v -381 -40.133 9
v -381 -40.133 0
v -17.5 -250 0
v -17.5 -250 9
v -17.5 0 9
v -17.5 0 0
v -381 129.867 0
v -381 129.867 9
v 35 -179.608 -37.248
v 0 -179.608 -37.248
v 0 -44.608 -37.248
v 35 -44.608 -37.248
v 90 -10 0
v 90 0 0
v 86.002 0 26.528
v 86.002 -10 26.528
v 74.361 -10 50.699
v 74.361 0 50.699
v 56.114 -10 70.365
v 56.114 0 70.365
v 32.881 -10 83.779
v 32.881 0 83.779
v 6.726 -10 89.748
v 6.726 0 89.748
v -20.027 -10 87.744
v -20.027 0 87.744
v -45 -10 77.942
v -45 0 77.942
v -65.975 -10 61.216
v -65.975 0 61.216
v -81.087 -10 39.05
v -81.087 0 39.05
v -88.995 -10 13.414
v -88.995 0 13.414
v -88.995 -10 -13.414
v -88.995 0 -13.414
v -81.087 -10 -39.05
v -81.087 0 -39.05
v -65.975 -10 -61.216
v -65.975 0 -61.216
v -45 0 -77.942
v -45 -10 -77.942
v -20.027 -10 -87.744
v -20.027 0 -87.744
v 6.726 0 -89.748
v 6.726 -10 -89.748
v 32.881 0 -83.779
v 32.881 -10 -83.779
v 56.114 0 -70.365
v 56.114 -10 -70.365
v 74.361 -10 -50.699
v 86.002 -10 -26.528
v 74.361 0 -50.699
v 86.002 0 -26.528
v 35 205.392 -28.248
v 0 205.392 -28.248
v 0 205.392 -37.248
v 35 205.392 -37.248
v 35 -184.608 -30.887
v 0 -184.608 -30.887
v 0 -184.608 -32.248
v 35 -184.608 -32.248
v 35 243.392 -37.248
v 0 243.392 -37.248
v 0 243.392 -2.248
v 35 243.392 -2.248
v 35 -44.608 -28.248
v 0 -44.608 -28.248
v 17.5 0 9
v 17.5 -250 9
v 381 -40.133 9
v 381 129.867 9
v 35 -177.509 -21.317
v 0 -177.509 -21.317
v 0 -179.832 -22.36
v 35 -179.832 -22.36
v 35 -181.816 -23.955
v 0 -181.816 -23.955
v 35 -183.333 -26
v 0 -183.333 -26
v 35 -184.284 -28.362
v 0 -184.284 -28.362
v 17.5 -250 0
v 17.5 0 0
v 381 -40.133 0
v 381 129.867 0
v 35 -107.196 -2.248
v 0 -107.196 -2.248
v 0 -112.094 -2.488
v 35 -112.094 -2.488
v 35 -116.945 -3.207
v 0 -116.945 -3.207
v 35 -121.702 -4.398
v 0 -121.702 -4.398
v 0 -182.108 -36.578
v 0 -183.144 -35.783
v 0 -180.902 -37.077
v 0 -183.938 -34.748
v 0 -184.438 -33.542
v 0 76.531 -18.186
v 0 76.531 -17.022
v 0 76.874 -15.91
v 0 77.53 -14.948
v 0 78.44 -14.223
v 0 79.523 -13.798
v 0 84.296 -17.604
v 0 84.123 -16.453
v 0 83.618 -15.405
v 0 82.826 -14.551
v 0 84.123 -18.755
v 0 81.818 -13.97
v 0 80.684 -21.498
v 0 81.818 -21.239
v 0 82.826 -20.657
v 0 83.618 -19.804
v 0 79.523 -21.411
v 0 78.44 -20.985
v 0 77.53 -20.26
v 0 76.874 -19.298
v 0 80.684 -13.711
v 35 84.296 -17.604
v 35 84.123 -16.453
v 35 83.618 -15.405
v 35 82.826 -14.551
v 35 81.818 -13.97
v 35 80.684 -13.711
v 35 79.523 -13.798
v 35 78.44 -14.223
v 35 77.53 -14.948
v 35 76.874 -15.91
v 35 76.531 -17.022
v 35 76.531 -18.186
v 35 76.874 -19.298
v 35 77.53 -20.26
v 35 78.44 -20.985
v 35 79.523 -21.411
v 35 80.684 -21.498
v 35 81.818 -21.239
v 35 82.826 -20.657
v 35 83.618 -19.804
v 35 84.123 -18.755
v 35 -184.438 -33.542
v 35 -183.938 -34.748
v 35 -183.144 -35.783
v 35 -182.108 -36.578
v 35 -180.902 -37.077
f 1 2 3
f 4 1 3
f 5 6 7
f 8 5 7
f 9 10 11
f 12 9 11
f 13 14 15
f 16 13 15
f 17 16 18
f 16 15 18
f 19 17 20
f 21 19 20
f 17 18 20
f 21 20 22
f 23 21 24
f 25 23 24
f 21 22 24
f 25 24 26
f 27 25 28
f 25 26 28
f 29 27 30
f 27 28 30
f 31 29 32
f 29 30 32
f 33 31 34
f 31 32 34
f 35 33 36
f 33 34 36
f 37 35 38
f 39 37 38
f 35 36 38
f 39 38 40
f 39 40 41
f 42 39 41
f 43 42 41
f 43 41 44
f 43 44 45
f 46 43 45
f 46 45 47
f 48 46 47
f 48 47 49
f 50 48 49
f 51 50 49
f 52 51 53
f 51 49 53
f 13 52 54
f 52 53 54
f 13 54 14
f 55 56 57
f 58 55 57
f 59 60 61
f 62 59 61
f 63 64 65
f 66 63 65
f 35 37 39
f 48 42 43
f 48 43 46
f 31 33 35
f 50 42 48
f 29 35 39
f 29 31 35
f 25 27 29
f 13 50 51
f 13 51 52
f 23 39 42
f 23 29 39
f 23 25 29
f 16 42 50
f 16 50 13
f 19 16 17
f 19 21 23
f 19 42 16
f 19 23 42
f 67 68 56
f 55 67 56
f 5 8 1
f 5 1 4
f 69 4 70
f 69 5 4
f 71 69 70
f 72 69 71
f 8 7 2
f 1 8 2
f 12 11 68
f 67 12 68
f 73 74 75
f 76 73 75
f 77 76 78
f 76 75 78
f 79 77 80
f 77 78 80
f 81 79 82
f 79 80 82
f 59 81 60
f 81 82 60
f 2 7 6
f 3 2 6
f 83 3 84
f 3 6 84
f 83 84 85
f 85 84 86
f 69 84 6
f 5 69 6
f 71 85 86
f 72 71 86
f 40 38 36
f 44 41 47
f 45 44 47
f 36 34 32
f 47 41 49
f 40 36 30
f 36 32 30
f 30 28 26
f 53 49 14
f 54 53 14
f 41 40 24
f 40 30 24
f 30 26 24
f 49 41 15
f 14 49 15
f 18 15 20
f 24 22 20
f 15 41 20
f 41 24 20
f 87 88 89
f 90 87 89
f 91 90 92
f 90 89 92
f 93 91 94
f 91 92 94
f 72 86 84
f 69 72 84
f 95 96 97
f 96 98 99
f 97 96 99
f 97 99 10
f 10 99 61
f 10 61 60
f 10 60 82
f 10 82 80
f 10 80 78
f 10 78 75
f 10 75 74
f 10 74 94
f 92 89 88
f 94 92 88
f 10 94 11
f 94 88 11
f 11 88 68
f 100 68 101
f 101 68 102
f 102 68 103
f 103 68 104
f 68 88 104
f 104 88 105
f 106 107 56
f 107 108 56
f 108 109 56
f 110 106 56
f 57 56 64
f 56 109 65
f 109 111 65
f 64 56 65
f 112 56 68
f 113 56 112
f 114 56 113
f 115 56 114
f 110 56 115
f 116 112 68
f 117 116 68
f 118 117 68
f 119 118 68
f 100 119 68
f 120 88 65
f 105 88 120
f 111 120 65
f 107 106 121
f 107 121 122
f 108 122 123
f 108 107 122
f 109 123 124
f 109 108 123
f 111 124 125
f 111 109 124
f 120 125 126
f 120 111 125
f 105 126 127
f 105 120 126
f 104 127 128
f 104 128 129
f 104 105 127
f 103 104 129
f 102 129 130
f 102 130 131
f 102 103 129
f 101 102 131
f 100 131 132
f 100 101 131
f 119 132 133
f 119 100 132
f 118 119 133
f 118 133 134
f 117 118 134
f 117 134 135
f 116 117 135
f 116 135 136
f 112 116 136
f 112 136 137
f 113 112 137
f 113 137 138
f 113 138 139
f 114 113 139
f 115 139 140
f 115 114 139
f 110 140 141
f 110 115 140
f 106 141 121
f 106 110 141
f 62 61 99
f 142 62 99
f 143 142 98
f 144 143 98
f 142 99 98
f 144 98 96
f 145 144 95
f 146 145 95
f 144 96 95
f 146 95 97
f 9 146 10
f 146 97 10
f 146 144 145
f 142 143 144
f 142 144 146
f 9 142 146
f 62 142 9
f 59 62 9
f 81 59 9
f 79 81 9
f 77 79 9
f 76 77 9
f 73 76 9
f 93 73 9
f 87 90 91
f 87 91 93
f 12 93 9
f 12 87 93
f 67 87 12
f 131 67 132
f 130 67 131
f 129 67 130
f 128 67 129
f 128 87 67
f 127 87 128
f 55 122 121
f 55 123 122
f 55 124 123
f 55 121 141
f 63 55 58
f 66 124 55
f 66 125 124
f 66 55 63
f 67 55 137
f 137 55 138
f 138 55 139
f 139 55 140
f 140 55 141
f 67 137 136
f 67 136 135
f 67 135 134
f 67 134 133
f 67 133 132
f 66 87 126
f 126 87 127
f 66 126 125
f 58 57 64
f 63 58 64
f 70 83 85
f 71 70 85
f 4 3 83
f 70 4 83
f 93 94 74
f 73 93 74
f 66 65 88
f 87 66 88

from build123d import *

# Parameters (mm, degrees)
F1_DEPTH = 9
F2_R     = 90
F3_DEPTH = 10
F4_R     = 3.904465
F5_DEPTH = 35


with BuildPart() as f1:
    # F0 (on Top) → F1 (new body)
    with BuildSketch(Plane.XY):
        Polygon((-17.5, 0), (-381, 129.866823), (-381, -40.133177), (-17.5, -250), (17.5, -250), (381, -40.133177), (381, 129.866823), (17.5, 0), (0, 0), align=None)
    extrude(amount=F1_DEPTH)


with BuildPart() as f3:
    # F2 (on Front) → F3 (new body)
    with BuildSketch(Plane.XZ):
        Circle(F2_R)
    extrude(amount=F3_DEPTH)


with BuildPart() as f5:
    # F4 (on Right) → F5 (new body)
    with BuildSketch(Plane.YZ):
        with BuildLine():
            Line((-114.608236, -37.247673), (-44.608236, -37.247673))
            Line((-44.608236, -37.247673), (-44.608236, -28.247673))
            Line((-44.608236, -28.247673), (80.391764, -28.247673))
            Line((80.391764, -28.247673), (205.391764, -28.247673))
            Line((205.391764, -28.247673), (205.391764, -37.247673))
            Line((205.391764, -37.247673), (243.391764, -37.247673))
            Line((243.391764, -37.247673), (243.391764, -2.247673))
            Line((243.391764, -2.247673), (-107.195699, -2.247673))
            ThreePointArc((-107.195699, -2.247673), (-114.528097, -2.788236), (-121.70195, -4.398236))
            Line((-121.70195, -4.398236), (-177.509486, -21.3171))
            ThreePointArc((-177.509486, -21.3171), (-182.639814, -24.929324), (-184.608236, -30.886987))
            Line((-184.608236, -30.886987), (-184.608236, -32.247673))
            ThreePointArc((-184.608236, -32.247673), (-183.14377, -35.783207), (-179.608236, -37.247673))
            Line((-179.608236, -37.247673), (-114.608236, -37.247673))
        make_face()
        with Locations((80.391764, -17.60412)):
            Circle(F4_R, mode=Mode.SUBTRACT)
    extrude(amount=F5_DEPTH)


solid = Compound([f1.part, f3.part, f5.part])
